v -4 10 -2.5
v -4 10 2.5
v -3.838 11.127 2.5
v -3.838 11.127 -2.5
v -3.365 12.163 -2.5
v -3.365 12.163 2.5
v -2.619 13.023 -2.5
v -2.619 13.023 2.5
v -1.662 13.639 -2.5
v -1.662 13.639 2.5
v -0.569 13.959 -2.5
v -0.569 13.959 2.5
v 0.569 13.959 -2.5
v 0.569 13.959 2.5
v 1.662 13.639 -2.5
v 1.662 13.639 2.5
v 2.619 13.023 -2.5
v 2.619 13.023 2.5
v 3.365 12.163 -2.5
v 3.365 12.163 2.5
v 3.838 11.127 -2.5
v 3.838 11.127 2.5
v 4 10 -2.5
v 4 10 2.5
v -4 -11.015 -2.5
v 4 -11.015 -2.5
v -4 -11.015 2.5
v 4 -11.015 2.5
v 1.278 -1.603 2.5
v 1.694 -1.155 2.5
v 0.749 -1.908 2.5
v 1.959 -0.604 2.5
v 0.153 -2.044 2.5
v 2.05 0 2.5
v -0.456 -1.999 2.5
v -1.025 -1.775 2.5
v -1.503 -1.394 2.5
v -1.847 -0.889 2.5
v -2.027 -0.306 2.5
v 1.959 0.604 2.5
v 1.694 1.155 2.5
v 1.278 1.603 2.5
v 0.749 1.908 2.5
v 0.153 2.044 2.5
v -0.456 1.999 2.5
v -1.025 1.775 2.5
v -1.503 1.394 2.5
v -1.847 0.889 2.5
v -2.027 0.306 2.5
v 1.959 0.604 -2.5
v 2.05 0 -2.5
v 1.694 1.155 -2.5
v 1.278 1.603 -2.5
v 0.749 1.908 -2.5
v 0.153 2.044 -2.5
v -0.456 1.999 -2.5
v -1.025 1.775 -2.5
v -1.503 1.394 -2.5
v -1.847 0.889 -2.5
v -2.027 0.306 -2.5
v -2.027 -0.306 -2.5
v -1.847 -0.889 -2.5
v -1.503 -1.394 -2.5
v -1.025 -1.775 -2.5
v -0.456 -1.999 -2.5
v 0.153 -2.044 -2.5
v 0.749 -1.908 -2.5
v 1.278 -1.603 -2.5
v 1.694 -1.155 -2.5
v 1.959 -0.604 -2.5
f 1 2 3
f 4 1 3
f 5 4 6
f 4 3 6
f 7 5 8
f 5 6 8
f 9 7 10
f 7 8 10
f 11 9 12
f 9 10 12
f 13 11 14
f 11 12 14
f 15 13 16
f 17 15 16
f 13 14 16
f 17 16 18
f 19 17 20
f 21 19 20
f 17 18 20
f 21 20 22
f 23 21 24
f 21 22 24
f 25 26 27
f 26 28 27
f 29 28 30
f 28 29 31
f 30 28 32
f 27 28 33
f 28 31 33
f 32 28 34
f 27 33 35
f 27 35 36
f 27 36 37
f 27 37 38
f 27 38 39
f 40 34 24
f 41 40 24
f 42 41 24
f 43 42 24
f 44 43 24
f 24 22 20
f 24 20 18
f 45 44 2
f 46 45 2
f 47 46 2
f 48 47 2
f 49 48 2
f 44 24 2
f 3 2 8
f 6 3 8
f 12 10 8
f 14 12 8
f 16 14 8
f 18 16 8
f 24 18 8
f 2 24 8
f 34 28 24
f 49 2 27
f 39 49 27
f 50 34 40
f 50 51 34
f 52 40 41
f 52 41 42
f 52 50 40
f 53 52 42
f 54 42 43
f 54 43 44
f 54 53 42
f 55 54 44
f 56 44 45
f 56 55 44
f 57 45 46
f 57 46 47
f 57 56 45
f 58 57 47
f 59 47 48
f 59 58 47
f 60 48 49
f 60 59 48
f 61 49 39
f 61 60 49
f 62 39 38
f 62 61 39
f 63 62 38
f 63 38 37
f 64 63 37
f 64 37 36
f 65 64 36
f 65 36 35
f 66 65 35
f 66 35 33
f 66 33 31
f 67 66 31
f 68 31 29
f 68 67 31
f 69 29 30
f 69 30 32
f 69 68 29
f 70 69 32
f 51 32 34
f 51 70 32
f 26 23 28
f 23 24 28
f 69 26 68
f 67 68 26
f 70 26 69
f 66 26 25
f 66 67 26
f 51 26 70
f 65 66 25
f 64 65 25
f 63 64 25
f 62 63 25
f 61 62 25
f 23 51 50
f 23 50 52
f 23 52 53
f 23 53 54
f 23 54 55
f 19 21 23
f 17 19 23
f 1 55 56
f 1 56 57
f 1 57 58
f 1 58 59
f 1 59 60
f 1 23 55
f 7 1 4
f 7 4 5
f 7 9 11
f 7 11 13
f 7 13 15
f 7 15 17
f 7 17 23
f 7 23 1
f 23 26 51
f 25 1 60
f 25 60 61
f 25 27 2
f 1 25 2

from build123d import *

# Parameters (mm, degrees)
SKETCH_1_R      = 2.05
EXTRUDE_1_DEPTH = 2.5


with BuildPart() as part:
    # 스케치1 → 보스-돌출1 (new, symmetric)
    with BuildSketch(Plane.XY):
        with BuildLine():
            Line((-4, 0), (-4, 10))
            ThreePointArc((-4, 10), (0, 14), (4, 10))
            Line((4, 10), (4, 0))
            Line((4, 0), (4, -11.014558485))
            Line((4, -11.014558485), (-4, -11.014558485))
            Line((-4, -11.014558485), (-4, 0))
        make_face()
        Circle(SKETCH_1_R, mode=Mode.SUBTRACT)
    extrude(amount=EXTRUDE_1_DEPTH, both=True)


solid = part.part
